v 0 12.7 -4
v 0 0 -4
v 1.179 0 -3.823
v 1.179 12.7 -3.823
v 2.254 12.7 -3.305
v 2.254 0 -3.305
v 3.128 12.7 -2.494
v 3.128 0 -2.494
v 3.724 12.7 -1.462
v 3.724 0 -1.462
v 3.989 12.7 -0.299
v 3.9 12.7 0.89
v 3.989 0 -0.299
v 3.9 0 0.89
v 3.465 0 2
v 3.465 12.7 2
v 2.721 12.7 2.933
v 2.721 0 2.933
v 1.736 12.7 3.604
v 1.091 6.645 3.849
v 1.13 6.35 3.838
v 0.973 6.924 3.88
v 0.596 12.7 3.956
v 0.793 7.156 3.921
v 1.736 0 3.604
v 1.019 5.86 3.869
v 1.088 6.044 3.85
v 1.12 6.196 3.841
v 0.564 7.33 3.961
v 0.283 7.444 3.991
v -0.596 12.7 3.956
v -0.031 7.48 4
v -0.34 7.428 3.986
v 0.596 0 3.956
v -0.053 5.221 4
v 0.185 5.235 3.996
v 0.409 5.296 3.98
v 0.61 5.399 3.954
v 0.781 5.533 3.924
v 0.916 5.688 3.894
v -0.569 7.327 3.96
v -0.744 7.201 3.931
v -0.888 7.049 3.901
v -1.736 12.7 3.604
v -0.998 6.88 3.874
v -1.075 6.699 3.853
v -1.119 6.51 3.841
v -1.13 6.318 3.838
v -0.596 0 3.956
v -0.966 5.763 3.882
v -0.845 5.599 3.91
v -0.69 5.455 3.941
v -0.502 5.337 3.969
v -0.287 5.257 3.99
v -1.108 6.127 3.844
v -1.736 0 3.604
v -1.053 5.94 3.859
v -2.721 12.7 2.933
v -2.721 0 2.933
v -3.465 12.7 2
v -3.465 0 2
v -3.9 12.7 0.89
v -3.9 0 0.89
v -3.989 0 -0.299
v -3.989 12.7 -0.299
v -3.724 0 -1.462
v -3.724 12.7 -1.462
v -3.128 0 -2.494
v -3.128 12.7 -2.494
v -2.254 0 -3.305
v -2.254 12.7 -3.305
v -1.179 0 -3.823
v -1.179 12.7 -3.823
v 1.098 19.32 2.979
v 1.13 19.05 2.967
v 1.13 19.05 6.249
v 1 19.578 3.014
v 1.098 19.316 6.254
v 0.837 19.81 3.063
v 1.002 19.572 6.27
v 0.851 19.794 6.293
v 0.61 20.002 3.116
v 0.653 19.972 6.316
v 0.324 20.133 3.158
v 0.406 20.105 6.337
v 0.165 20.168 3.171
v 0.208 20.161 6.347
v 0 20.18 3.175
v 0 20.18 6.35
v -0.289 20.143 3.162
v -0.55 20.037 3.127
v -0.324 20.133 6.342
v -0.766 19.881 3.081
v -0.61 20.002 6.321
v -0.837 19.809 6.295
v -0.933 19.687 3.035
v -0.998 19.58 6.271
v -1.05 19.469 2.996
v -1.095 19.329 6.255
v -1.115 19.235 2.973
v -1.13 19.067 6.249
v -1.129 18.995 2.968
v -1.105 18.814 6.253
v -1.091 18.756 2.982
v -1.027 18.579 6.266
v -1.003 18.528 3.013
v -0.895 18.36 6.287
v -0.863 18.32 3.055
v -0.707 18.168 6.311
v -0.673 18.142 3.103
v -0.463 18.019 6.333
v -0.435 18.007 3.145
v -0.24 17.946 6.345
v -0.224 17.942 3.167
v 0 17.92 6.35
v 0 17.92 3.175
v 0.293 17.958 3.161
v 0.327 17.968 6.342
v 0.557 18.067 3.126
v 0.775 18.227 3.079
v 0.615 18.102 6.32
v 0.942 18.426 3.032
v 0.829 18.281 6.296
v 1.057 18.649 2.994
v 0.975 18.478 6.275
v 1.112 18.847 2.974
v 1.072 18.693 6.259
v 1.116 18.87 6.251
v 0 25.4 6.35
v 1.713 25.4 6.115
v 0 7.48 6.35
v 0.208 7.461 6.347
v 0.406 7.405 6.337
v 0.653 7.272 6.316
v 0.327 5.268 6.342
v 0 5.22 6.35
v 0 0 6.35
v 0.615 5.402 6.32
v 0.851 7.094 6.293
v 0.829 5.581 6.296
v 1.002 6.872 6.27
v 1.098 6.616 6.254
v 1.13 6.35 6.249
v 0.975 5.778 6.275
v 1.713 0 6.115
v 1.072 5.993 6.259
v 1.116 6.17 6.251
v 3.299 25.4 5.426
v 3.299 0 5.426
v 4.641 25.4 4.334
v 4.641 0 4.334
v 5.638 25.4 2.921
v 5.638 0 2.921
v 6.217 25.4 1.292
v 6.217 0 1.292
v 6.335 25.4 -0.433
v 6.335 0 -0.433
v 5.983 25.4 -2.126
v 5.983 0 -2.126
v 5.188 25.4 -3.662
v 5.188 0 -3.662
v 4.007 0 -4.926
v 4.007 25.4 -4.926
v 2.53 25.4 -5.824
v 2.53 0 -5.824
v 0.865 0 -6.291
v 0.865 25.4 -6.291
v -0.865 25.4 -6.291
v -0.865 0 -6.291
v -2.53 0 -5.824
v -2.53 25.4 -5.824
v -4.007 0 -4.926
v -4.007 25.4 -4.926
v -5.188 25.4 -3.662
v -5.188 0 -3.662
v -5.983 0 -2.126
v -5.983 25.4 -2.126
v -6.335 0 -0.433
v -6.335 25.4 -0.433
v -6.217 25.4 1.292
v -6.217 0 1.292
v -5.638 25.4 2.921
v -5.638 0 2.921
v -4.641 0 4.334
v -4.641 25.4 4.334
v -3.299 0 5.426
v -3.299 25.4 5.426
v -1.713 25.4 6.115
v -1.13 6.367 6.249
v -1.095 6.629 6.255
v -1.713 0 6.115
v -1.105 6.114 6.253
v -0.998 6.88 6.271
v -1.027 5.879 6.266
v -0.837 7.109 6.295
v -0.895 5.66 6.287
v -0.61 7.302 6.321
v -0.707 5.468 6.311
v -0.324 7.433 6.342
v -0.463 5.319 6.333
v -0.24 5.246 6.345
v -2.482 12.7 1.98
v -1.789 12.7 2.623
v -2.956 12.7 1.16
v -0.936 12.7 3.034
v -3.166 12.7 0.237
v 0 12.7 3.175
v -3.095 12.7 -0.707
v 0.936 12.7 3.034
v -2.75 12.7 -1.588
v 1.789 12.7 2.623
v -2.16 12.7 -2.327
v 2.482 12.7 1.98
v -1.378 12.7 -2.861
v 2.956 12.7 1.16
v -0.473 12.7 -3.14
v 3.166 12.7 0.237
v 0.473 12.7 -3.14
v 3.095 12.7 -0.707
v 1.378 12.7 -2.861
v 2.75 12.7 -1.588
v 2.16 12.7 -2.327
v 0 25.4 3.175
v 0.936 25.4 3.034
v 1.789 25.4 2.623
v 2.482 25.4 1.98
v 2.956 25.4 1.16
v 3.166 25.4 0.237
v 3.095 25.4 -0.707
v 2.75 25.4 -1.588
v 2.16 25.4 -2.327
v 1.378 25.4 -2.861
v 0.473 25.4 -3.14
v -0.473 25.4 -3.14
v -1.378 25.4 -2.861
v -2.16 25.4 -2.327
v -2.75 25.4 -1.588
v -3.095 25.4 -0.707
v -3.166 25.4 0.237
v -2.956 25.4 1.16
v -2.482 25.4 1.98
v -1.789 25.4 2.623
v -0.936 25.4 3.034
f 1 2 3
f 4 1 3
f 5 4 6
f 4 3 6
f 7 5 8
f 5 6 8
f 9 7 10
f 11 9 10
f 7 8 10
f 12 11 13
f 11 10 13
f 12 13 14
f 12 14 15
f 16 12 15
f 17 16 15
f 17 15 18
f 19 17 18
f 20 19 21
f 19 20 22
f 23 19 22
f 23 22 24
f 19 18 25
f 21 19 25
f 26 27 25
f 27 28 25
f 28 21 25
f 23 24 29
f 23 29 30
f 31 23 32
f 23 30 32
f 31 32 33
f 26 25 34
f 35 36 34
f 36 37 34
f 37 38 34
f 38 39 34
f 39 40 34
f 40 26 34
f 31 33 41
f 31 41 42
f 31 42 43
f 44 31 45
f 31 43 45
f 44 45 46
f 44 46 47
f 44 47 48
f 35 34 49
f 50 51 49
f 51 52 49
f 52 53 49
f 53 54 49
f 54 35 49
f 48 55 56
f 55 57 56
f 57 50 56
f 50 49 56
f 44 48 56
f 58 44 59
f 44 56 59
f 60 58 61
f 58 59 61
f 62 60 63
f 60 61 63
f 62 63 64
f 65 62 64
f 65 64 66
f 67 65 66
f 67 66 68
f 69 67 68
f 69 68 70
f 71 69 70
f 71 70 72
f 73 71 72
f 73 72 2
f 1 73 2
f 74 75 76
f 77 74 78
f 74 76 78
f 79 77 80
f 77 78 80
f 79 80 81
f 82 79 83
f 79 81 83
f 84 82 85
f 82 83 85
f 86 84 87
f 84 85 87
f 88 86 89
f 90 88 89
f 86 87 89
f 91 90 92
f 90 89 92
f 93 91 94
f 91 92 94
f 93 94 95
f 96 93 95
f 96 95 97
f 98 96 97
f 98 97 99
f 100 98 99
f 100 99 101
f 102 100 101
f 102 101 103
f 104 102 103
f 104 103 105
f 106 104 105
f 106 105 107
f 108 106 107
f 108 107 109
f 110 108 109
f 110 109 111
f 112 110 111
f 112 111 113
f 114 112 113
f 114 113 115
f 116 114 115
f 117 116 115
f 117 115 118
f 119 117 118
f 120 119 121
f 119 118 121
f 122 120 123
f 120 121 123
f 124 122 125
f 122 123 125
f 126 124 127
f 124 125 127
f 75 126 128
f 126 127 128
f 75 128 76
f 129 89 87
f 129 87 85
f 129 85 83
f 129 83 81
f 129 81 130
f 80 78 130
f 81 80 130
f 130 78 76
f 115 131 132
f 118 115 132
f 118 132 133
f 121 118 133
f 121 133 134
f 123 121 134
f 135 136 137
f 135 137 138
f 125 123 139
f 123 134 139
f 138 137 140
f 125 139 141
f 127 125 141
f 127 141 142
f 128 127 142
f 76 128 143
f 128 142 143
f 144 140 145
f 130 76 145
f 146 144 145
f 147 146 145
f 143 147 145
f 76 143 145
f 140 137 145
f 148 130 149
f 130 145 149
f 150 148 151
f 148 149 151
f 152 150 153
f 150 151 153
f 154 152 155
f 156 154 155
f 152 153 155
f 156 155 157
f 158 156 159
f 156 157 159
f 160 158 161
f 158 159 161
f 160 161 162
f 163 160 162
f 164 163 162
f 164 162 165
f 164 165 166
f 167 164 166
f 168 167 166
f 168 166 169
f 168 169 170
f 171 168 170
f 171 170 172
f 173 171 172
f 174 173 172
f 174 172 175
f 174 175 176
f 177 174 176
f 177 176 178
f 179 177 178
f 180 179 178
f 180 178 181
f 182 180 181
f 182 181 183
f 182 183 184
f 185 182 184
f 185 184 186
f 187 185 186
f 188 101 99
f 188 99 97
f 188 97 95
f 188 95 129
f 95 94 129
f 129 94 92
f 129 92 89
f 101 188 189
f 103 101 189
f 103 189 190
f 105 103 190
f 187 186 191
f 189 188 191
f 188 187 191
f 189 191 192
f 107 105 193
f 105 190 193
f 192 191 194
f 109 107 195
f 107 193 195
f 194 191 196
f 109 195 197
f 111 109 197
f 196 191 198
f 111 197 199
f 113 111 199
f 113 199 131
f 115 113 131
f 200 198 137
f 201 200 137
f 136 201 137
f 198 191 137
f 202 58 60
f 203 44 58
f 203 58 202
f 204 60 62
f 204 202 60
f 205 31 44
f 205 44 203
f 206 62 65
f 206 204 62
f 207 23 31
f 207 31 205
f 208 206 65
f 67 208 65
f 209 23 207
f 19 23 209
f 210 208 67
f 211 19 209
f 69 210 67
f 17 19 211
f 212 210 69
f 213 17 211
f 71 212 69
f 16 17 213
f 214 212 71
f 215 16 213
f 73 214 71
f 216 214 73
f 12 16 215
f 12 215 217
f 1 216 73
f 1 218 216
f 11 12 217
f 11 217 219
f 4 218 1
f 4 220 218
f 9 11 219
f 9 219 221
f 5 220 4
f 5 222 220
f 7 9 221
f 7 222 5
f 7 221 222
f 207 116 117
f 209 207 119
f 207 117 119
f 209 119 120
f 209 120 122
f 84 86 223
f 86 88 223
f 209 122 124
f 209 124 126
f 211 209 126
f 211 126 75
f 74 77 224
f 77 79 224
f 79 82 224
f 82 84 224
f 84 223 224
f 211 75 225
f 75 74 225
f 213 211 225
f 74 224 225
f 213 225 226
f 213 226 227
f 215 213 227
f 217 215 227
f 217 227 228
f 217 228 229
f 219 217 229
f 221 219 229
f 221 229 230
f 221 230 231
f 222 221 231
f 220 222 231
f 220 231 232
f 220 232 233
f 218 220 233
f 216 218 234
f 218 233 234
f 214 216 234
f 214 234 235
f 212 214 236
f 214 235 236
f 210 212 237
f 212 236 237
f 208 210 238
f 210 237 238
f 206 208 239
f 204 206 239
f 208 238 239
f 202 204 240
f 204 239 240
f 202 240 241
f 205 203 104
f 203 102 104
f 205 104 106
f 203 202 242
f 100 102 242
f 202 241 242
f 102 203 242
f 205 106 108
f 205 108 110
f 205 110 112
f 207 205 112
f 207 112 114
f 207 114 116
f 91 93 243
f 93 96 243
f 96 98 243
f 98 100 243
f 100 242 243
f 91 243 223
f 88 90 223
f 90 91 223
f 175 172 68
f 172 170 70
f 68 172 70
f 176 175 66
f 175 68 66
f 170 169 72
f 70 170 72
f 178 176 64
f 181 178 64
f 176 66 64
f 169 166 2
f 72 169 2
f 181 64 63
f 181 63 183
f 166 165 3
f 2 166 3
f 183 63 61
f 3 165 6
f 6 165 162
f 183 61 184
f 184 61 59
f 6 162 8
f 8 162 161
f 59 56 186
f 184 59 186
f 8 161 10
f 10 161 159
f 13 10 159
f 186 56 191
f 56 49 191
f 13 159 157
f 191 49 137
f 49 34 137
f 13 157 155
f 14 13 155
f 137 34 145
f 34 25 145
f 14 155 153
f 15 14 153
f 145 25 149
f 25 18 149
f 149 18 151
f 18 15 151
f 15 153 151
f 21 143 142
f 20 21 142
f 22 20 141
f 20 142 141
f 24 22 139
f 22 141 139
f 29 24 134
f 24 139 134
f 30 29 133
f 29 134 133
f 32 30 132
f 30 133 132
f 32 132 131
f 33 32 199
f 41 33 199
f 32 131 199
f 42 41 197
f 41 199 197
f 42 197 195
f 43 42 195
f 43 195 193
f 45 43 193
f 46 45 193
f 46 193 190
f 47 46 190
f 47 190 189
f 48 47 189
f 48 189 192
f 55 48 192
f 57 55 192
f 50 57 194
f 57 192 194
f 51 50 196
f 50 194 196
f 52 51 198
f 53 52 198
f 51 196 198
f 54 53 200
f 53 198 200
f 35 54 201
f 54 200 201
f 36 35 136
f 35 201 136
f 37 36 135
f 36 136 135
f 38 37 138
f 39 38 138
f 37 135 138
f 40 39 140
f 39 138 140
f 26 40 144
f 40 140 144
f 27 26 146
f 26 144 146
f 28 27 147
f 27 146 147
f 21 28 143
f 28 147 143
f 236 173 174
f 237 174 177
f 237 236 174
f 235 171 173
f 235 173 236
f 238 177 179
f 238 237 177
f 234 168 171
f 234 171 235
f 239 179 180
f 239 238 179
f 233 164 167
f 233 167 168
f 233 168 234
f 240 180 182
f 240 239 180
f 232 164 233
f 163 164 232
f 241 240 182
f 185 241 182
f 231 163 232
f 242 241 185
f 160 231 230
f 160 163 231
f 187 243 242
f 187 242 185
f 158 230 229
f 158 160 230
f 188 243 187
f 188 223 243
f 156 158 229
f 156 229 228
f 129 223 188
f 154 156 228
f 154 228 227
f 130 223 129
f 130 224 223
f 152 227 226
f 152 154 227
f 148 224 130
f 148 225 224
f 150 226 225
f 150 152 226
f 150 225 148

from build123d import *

# Parameters (mm, degrees)
SKETCH1_R               = 6.35
BOSS_EXTRUDE1_DEPTH     = 25.4
CUT_EXTRUDE2_DEPTH      = 27.940768363
CUT_EXTRUDE2_DEPTH_BACK = 12.7
SKETCH3_R               = 4
SKETCH6_R               = 4.0005
CUT_EXTRUDE5_DEPTH      = 12.7
SKETCH4_R               = 1.1303
CUT_EXTRUDE3_DEPTH      = 6.35
SKETCH7_R               = 3.175
CUT_EXTRUDE6_DEPTH      = 12.7


with BuildPart() as part:
    # Sketch1 → Boss-Extrude1 (new body)
    with BuildSketch(Plane(origin=(0, 0, 0), x_dir=(1, 0, 0), z_dir=(0, 1, 0))):
        with Locations(Location((0, 0, 0), (0, 0, 270))):
            Circle(SKETCH1_R)
    extrude(amount=BOSS_EXTRUDE1_DEPTH)

    # Sketch3 → Cut-Extrude2 (cut, two sides: drawn at the far end of the back side and taken through both)
    with BuildSketch(Plane.XZ.offset(-CUT_EXTRUDE2_DEPTH_BACK)):
        with Locations(Location((0, 0, 0), (0, 0, 90))):
            Circle(SKETCH3_R)
    extrude(amount=CUT_EXTRUDE2_DEPTH + CUT_EXTRUDE2_DEPTH_BACK, mode=Mode.SUBTRACT)

    # Sketch6 → Cut-Extrude5 (cut)
    with BuildSketch(Plane(origin=(0, 0, 0), x_dir=(-1, 0, 0), z_dir=(0, -1, 0))):
        with Locations(Location((0, 0, 0), (0, 0, 90))):
            Circle(SKETCH6_R)
    extrude(amount=-CUT_EXTRUDE5_DEPTH, mode=Mode.SUBTRACT)

    # Sketch4 → Cut-Extrude3 (cut)
    with BuildSketch(Plane.XY.offset(6.35)):
        with Locations((0, 6.35)):
            Circle(SKETCH4_R)
        with Locations((0, 19.05)):
            Circle(SKETCH4_R)
    extrude(amount=-CUT_EXTRUDE3_DEPTH, mode=Mode.SUBTRACT)

    # Sketch7 → Cut-Extrude6 (cut)
    with BuildSketch(Plane(origin=(0, 25.4, 0), x_dir=(1, 0, 0), z_dir=(0, 1, 0))):
        with Locations(Location((0, 0, 0), (0, 0, 270))):
            Circle(SKETCH7_R)
    extrude(amount=-CUT_EXTRUDE6_DEPTH, mode=Mode.SUBTRACT)


solid = part.part
